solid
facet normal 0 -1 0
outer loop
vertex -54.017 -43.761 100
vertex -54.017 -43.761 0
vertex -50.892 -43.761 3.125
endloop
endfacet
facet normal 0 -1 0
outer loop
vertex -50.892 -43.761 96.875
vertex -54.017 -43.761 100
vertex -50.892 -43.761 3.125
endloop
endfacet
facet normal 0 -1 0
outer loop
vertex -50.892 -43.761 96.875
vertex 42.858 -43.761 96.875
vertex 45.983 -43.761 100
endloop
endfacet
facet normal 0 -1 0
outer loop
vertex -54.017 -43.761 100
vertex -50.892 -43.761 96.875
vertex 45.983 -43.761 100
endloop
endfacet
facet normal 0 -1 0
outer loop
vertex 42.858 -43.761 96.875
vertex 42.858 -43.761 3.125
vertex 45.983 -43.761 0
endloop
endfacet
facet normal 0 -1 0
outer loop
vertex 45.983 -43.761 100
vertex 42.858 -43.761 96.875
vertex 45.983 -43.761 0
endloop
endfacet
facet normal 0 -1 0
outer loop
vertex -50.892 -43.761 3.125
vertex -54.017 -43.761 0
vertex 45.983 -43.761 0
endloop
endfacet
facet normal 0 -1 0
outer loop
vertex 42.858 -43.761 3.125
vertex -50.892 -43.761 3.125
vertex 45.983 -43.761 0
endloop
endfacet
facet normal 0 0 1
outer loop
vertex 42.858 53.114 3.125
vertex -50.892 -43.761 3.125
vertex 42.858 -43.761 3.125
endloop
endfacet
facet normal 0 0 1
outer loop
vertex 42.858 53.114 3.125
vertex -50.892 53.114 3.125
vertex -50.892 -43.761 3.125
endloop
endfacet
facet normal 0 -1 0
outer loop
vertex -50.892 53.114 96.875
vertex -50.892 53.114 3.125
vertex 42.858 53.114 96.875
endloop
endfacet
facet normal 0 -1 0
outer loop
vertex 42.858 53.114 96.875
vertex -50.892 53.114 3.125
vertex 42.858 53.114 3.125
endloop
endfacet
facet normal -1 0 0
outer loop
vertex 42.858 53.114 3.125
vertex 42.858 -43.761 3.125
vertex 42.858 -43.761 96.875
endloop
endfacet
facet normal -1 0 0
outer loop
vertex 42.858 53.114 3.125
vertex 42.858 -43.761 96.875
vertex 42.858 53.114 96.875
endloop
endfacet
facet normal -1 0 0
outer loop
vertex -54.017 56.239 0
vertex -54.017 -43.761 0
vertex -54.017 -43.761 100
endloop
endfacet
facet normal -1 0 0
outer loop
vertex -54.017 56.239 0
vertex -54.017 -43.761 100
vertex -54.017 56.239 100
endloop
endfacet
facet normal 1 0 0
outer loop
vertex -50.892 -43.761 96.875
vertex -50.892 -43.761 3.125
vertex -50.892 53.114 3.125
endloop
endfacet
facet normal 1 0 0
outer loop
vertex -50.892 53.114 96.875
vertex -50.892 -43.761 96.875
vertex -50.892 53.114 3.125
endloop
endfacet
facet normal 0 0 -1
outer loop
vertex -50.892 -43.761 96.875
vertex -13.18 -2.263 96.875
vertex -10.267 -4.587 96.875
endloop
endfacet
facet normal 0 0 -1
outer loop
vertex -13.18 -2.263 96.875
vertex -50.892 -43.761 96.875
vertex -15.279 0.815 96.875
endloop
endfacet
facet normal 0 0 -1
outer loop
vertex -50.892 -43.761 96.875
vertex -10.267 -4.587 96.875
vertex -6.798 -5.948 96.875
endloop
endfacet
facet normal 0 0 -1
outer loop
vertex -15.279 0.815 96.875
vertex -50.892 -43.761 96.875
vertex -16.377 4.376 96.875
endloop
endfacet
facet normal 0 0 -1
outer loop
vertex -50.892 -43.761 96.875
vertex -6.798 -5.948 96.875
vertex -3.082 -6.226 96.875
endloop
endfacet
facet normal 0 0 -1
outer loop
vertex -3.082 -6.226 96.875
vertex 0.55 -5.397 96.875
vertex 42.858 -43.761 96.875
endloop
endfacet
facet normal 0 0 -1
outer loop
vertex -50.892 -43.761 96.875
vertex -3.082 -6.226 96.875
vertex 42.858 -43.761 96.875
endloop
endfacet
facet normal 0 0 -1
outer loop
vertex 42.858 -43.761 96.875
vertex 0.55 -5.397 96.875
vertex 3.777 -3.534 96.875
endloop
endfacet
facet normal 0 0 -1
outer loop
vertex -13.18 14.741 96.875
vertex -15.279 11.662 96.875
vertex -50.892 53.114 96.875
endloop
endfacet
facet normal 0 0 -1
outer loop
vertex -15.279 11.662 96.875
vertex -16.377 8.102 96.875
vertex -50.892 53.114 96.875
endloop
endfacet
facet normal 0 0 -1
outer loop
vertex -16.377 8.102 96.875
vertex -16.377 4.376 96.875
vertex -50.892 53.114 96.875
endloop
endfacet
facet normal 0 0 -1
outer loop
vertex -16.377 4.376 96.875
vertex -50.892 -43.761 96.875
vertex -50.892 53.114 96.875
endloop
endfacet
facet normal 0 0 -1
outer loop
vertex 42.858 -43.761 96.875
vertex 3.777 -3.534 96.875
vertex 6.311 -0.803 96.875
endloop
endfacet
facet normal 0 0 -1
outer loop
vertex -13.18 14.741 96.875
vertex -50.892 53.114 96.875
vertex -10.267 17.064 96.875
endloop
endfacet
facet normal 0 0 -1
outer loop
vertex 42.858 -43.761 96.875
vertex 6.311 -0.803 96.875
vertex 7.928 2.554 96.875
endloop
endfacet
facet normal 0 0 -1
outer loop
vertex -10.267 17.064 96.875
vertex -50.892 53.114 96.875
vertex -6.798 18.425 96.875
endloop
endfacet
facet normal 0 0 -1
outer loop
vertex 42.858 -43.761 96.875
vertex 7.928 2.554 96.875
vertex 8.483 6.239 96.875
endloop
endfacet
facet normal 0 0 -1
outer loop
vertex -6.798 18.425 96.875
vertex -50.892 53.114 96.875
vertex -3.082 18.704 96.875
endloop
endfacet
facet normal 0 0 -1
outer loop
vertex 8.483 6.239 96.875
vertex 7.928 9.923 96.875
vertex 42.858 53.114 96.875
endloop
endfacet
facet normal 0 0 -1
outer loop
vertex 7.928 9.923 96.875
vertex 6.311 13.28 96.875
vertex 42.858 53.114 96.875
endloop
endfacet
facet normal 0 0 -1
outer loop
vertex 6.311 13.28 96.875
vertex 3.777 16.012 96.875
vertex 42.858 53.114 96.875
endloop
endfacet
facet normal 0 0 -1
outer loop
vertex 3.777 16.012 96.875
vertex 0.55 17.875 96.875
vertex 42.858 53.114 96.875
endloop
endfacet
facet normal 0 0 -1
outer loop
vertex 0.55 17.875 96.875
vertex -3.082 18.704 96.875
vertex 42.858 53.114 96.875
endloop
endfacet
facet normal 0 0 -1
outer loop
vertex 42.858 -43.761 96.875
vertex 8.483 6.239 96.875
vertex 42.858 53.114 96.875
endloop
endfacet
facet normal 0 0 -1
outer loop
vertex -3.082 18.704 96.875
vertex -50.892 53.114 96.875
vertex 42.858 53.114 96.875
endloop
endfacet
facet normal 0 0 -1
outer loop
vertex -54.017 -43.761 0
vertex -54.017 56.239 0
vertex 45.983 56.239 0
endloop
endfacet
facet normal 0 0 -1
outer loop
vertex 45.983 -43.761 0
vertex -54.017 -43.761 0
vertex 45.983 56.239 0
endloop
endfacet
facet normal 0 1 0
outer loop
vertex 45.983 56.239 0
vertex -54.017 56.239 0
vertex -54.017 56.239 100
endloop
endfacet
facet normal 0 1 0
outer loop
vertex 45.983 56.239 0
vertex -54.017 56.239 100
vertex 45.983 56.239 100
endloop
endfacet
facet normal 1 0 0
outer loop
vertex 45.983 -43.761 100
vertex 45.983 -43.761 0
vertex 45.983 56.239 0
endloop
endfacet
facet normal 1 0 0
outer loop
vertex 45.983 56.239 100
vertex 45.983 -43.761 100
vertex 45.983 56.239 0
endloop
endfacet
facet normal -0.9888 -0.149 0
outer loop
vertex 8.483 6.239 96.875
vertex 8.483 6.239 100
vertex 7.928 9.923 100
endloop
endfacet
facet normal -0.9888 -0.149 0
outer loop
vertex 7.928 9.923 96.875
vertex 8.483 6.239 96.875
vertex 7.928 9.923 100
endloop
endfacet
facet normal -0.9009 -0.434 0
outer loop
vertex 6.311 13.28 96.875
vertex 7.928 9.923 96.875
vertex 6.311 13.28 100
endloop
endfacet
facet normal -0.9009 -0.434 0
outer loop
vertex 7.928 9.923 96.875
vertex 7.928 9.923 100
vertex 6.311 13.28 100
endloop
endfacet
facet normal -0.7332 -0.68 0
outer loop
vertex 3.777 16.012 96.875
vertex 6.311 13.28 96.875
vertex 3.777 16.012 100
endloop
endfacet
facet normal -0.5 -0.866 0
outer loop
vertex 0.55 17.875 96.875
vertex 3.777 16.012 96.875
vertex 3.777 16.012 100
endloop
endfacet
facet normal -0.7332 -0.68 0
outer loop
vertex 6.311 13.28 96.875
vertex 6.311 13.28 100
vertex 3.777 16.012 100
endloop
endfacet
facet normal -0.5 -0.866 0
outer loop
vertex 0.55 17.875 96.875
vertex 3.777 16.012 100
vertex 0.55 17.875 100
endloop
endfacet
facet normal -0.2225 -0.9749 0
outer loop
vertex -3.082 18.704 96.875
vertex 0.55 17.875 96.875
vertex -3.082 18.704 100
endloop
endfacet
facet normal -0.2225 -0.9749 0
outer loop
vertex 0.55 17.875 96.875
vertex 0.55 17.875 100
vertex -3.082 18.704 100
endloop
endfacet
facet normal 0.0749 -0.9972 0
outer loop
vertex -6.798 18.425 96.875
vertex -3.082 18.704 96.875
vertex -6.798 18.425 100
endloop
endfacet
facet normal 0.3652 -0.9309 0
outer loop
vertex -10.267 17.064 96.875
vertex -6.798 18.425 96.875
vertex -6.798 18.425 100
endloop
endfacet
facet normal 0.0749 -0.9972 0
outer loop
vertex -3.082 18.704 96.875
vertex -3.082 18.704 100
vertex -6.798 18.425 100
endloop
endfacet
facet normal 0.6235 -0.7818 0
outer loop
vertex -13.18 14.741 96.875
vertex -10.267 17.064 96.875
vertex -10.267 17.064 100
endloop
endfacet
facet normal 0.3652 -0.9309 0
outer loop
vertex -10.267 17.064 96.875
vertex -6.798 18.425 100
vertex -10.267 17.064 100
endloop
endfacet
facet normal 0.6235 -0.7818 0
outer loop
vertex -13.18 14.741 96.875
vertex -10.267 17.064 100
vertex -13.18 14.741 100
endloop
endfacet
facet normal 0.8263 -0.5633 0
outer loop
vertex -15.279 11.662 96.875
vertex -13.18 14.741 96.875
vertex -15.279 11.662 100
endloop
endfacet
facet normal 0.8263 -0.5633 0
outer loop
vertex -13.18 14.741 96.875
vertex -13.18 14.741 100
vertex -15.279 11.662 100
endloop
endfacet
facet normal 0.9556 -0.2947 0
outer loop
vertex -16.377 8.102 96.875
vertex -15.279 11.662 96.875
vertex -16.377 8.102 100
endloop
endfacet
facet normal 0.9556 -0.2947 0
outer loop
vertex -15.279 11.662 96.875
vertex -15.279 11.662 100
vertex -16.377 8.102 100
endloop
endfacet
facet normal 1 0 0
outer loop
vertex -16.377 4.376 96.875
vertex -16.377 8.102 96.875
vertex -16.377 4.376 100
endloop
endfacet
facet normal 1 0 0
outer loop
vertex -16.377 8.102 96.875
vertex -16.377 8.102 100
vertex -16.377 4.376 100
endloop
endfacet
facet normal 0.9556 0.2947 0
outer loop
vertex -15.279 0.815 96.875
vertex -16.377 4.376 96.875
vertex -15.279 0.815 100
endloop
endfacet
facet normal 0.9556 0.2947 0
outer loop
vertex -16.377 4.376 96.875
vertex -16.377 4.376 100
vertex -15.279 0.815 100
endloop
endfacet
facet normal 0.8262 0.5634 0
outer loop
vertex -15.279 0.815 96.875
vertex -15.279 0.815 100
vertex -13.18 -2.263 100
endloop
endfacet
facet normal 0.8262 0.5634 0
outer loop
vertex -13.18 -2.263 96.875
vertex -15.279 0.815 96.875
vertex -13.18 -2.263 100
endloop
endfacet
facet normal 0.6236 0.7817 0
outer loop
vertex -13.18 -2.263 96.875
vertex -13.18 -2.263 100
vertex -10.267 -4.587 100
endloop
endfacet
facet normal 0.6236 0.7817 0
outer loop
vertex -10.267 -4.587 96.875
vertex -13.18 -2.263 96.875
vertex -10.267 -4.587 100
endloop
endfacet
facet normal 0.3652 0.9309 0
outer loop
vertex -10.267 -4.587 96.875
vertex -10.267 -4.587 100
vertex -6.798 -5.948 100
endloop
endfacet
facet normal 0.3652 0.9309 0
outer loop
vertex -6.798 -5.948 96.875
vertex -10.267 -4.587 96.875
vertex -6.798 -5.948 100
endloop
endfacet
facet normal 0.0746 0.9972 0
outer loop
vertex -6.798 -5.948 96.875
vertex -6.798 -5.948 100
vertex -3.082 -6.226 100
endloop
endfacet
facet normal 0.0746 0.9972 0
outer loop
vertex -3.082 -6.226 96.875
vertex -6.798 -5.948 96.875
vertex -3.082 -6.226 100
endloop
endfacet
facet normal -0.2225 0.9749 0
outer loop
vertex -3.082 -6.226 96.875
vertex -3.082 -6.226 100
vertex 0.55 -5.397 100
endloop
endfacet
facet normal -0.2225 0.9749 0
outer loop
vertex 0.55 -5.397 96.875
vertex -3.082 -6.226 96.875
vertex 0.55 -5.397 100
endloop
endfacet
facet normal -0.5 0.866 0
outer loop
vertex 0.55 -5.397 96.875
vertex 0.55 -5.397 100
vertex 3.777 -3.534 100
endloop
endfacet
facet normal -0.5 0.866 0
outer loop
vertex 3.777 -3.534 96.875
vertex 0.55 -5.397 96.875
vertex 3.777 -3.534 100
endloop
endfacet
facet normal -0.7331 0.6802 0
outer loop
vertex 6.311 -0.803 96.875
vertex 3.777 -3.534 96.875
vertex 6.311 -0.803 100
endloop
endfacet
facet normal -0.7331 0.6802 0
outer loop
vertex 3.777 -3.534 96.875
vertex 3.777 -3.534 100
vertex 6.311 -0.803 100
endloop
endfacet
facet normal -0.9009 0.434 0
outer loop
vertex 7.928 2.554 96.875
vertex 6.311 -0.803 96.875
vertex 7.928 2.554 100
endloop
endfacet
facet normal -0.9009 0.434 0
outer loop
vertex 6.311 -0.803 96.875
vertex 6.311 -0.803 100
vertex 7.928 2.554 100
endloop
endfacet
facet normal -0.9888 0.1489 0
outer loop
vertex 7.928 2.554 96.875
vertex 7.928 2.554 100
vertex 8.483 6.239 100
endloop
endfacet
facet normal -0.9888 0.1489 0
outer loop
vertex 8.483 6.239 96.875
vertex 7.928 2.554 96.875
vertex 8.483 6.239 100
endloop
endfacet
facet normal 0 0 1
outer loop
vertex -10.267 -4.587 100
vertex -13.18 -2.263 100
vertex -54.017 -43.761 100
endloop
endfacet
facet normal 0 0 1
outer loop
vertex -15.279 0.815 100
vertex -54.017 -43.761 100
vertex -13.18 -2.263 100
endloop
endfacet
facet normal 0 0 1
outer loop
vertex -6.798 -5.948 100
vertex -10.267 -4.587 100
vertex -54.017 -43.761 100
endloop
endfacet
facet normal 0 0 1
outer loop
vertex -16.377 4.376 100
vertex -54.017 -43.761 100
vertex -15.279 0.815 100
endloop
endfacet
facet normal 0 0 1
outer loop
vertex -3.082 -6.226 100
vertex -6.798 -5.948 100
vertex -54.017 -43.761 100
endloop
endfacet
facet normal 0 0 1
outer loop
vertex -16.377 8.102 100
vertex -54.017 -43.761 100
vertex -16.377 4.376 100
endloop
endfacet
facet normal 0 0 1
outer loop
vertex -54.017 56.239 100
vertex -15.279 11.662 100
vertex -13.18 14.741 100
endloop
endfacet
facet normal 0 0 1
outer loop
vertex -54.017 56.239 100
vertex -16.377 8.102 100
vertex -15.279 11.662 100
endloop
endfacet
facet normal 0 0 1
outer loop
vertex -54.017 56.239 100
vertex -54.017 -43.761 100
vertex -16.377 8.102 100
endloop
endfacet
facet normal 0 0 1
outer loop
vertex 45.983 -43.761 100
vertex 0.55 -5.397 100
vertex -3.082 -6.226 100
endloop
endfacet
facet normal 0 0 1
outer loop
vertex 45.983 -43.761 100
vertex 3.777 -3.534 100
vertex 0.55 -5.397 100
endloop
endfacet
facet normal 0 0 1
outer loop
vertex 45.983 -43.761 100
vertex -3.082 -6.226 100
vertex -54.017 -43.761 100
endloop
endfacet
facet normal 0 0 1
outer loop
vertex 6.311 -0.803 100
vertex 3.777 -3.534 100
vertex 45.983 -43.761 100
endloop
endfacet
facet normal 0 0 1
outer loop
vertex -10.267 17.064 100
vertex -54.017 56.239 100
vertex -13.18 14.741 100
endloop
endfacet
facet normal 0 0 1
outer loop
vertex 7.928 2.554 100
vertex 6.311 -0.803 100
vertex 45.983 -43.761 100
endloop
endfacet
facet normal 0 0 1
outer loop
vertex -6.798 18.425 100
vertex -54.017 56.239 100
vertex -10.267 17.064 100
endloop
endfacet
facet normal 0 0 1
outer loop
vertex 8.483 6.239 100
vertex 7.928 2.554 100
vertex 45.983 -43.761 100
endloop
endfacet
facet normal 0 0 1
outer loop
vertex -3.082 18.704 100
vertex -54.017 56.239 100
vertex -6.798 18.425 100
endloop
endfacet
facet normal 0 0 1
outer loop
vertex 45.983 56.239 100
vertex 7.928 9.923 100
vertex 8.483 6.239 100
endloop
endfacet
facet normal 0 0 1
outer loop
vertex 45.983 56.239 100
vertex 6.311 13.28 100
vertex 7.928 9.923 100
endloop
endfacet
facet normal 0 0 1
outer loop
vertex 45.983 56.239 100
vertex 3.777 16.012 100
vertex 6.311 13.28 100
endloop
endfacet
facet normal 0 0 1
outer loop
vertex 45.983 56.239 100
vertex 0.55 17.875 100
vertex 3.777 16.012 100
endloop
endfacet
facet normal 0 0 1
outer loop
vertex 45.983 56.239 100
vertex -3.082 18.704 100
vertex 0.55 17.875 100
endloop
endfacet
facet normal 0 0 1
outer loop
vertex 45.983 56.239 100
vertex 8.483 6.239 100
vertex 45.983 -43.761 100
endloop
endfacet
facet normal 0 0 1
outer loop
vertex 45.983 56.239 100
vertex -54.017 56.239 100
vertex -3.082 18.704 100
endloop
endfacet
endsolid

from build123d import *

# Parameters (mm, degrees)
F0_W     = 100
F0_H     = 100
F1_DEPTH = 100
F2_T     = -3.125
F3_R     = 12.5
F4_DEPTH = 3.125


with BuildPart() as f1:
    # F0 (on Top) → F1 (new body)
    with BuildSketch(Plane.XY):
        with Locations((-4.0166154504, 6.2387808433)):
            Rectangle(F0_W, F0_H)
    extrude(amount=F1_DEPTH)

    # F2
    f2_openings = [f1.faces().sort_by_distance(p)[0] for p in [
        (-4.016615, -43.761219, 50),
    ]]
    offset(amount=F2_T, openings=f2_openings)

    # F3 (on face) → F4 (cut, through all)
    with BuildSketch(Plane.XY.offset(100)):
        with Locations((-4.0166154504, 6.2387808433)):
            Circle(F3_R)
    extrude(amount=-F4_DEPTH, mode=Mode.SUBTRACT)


solid = f1.part
